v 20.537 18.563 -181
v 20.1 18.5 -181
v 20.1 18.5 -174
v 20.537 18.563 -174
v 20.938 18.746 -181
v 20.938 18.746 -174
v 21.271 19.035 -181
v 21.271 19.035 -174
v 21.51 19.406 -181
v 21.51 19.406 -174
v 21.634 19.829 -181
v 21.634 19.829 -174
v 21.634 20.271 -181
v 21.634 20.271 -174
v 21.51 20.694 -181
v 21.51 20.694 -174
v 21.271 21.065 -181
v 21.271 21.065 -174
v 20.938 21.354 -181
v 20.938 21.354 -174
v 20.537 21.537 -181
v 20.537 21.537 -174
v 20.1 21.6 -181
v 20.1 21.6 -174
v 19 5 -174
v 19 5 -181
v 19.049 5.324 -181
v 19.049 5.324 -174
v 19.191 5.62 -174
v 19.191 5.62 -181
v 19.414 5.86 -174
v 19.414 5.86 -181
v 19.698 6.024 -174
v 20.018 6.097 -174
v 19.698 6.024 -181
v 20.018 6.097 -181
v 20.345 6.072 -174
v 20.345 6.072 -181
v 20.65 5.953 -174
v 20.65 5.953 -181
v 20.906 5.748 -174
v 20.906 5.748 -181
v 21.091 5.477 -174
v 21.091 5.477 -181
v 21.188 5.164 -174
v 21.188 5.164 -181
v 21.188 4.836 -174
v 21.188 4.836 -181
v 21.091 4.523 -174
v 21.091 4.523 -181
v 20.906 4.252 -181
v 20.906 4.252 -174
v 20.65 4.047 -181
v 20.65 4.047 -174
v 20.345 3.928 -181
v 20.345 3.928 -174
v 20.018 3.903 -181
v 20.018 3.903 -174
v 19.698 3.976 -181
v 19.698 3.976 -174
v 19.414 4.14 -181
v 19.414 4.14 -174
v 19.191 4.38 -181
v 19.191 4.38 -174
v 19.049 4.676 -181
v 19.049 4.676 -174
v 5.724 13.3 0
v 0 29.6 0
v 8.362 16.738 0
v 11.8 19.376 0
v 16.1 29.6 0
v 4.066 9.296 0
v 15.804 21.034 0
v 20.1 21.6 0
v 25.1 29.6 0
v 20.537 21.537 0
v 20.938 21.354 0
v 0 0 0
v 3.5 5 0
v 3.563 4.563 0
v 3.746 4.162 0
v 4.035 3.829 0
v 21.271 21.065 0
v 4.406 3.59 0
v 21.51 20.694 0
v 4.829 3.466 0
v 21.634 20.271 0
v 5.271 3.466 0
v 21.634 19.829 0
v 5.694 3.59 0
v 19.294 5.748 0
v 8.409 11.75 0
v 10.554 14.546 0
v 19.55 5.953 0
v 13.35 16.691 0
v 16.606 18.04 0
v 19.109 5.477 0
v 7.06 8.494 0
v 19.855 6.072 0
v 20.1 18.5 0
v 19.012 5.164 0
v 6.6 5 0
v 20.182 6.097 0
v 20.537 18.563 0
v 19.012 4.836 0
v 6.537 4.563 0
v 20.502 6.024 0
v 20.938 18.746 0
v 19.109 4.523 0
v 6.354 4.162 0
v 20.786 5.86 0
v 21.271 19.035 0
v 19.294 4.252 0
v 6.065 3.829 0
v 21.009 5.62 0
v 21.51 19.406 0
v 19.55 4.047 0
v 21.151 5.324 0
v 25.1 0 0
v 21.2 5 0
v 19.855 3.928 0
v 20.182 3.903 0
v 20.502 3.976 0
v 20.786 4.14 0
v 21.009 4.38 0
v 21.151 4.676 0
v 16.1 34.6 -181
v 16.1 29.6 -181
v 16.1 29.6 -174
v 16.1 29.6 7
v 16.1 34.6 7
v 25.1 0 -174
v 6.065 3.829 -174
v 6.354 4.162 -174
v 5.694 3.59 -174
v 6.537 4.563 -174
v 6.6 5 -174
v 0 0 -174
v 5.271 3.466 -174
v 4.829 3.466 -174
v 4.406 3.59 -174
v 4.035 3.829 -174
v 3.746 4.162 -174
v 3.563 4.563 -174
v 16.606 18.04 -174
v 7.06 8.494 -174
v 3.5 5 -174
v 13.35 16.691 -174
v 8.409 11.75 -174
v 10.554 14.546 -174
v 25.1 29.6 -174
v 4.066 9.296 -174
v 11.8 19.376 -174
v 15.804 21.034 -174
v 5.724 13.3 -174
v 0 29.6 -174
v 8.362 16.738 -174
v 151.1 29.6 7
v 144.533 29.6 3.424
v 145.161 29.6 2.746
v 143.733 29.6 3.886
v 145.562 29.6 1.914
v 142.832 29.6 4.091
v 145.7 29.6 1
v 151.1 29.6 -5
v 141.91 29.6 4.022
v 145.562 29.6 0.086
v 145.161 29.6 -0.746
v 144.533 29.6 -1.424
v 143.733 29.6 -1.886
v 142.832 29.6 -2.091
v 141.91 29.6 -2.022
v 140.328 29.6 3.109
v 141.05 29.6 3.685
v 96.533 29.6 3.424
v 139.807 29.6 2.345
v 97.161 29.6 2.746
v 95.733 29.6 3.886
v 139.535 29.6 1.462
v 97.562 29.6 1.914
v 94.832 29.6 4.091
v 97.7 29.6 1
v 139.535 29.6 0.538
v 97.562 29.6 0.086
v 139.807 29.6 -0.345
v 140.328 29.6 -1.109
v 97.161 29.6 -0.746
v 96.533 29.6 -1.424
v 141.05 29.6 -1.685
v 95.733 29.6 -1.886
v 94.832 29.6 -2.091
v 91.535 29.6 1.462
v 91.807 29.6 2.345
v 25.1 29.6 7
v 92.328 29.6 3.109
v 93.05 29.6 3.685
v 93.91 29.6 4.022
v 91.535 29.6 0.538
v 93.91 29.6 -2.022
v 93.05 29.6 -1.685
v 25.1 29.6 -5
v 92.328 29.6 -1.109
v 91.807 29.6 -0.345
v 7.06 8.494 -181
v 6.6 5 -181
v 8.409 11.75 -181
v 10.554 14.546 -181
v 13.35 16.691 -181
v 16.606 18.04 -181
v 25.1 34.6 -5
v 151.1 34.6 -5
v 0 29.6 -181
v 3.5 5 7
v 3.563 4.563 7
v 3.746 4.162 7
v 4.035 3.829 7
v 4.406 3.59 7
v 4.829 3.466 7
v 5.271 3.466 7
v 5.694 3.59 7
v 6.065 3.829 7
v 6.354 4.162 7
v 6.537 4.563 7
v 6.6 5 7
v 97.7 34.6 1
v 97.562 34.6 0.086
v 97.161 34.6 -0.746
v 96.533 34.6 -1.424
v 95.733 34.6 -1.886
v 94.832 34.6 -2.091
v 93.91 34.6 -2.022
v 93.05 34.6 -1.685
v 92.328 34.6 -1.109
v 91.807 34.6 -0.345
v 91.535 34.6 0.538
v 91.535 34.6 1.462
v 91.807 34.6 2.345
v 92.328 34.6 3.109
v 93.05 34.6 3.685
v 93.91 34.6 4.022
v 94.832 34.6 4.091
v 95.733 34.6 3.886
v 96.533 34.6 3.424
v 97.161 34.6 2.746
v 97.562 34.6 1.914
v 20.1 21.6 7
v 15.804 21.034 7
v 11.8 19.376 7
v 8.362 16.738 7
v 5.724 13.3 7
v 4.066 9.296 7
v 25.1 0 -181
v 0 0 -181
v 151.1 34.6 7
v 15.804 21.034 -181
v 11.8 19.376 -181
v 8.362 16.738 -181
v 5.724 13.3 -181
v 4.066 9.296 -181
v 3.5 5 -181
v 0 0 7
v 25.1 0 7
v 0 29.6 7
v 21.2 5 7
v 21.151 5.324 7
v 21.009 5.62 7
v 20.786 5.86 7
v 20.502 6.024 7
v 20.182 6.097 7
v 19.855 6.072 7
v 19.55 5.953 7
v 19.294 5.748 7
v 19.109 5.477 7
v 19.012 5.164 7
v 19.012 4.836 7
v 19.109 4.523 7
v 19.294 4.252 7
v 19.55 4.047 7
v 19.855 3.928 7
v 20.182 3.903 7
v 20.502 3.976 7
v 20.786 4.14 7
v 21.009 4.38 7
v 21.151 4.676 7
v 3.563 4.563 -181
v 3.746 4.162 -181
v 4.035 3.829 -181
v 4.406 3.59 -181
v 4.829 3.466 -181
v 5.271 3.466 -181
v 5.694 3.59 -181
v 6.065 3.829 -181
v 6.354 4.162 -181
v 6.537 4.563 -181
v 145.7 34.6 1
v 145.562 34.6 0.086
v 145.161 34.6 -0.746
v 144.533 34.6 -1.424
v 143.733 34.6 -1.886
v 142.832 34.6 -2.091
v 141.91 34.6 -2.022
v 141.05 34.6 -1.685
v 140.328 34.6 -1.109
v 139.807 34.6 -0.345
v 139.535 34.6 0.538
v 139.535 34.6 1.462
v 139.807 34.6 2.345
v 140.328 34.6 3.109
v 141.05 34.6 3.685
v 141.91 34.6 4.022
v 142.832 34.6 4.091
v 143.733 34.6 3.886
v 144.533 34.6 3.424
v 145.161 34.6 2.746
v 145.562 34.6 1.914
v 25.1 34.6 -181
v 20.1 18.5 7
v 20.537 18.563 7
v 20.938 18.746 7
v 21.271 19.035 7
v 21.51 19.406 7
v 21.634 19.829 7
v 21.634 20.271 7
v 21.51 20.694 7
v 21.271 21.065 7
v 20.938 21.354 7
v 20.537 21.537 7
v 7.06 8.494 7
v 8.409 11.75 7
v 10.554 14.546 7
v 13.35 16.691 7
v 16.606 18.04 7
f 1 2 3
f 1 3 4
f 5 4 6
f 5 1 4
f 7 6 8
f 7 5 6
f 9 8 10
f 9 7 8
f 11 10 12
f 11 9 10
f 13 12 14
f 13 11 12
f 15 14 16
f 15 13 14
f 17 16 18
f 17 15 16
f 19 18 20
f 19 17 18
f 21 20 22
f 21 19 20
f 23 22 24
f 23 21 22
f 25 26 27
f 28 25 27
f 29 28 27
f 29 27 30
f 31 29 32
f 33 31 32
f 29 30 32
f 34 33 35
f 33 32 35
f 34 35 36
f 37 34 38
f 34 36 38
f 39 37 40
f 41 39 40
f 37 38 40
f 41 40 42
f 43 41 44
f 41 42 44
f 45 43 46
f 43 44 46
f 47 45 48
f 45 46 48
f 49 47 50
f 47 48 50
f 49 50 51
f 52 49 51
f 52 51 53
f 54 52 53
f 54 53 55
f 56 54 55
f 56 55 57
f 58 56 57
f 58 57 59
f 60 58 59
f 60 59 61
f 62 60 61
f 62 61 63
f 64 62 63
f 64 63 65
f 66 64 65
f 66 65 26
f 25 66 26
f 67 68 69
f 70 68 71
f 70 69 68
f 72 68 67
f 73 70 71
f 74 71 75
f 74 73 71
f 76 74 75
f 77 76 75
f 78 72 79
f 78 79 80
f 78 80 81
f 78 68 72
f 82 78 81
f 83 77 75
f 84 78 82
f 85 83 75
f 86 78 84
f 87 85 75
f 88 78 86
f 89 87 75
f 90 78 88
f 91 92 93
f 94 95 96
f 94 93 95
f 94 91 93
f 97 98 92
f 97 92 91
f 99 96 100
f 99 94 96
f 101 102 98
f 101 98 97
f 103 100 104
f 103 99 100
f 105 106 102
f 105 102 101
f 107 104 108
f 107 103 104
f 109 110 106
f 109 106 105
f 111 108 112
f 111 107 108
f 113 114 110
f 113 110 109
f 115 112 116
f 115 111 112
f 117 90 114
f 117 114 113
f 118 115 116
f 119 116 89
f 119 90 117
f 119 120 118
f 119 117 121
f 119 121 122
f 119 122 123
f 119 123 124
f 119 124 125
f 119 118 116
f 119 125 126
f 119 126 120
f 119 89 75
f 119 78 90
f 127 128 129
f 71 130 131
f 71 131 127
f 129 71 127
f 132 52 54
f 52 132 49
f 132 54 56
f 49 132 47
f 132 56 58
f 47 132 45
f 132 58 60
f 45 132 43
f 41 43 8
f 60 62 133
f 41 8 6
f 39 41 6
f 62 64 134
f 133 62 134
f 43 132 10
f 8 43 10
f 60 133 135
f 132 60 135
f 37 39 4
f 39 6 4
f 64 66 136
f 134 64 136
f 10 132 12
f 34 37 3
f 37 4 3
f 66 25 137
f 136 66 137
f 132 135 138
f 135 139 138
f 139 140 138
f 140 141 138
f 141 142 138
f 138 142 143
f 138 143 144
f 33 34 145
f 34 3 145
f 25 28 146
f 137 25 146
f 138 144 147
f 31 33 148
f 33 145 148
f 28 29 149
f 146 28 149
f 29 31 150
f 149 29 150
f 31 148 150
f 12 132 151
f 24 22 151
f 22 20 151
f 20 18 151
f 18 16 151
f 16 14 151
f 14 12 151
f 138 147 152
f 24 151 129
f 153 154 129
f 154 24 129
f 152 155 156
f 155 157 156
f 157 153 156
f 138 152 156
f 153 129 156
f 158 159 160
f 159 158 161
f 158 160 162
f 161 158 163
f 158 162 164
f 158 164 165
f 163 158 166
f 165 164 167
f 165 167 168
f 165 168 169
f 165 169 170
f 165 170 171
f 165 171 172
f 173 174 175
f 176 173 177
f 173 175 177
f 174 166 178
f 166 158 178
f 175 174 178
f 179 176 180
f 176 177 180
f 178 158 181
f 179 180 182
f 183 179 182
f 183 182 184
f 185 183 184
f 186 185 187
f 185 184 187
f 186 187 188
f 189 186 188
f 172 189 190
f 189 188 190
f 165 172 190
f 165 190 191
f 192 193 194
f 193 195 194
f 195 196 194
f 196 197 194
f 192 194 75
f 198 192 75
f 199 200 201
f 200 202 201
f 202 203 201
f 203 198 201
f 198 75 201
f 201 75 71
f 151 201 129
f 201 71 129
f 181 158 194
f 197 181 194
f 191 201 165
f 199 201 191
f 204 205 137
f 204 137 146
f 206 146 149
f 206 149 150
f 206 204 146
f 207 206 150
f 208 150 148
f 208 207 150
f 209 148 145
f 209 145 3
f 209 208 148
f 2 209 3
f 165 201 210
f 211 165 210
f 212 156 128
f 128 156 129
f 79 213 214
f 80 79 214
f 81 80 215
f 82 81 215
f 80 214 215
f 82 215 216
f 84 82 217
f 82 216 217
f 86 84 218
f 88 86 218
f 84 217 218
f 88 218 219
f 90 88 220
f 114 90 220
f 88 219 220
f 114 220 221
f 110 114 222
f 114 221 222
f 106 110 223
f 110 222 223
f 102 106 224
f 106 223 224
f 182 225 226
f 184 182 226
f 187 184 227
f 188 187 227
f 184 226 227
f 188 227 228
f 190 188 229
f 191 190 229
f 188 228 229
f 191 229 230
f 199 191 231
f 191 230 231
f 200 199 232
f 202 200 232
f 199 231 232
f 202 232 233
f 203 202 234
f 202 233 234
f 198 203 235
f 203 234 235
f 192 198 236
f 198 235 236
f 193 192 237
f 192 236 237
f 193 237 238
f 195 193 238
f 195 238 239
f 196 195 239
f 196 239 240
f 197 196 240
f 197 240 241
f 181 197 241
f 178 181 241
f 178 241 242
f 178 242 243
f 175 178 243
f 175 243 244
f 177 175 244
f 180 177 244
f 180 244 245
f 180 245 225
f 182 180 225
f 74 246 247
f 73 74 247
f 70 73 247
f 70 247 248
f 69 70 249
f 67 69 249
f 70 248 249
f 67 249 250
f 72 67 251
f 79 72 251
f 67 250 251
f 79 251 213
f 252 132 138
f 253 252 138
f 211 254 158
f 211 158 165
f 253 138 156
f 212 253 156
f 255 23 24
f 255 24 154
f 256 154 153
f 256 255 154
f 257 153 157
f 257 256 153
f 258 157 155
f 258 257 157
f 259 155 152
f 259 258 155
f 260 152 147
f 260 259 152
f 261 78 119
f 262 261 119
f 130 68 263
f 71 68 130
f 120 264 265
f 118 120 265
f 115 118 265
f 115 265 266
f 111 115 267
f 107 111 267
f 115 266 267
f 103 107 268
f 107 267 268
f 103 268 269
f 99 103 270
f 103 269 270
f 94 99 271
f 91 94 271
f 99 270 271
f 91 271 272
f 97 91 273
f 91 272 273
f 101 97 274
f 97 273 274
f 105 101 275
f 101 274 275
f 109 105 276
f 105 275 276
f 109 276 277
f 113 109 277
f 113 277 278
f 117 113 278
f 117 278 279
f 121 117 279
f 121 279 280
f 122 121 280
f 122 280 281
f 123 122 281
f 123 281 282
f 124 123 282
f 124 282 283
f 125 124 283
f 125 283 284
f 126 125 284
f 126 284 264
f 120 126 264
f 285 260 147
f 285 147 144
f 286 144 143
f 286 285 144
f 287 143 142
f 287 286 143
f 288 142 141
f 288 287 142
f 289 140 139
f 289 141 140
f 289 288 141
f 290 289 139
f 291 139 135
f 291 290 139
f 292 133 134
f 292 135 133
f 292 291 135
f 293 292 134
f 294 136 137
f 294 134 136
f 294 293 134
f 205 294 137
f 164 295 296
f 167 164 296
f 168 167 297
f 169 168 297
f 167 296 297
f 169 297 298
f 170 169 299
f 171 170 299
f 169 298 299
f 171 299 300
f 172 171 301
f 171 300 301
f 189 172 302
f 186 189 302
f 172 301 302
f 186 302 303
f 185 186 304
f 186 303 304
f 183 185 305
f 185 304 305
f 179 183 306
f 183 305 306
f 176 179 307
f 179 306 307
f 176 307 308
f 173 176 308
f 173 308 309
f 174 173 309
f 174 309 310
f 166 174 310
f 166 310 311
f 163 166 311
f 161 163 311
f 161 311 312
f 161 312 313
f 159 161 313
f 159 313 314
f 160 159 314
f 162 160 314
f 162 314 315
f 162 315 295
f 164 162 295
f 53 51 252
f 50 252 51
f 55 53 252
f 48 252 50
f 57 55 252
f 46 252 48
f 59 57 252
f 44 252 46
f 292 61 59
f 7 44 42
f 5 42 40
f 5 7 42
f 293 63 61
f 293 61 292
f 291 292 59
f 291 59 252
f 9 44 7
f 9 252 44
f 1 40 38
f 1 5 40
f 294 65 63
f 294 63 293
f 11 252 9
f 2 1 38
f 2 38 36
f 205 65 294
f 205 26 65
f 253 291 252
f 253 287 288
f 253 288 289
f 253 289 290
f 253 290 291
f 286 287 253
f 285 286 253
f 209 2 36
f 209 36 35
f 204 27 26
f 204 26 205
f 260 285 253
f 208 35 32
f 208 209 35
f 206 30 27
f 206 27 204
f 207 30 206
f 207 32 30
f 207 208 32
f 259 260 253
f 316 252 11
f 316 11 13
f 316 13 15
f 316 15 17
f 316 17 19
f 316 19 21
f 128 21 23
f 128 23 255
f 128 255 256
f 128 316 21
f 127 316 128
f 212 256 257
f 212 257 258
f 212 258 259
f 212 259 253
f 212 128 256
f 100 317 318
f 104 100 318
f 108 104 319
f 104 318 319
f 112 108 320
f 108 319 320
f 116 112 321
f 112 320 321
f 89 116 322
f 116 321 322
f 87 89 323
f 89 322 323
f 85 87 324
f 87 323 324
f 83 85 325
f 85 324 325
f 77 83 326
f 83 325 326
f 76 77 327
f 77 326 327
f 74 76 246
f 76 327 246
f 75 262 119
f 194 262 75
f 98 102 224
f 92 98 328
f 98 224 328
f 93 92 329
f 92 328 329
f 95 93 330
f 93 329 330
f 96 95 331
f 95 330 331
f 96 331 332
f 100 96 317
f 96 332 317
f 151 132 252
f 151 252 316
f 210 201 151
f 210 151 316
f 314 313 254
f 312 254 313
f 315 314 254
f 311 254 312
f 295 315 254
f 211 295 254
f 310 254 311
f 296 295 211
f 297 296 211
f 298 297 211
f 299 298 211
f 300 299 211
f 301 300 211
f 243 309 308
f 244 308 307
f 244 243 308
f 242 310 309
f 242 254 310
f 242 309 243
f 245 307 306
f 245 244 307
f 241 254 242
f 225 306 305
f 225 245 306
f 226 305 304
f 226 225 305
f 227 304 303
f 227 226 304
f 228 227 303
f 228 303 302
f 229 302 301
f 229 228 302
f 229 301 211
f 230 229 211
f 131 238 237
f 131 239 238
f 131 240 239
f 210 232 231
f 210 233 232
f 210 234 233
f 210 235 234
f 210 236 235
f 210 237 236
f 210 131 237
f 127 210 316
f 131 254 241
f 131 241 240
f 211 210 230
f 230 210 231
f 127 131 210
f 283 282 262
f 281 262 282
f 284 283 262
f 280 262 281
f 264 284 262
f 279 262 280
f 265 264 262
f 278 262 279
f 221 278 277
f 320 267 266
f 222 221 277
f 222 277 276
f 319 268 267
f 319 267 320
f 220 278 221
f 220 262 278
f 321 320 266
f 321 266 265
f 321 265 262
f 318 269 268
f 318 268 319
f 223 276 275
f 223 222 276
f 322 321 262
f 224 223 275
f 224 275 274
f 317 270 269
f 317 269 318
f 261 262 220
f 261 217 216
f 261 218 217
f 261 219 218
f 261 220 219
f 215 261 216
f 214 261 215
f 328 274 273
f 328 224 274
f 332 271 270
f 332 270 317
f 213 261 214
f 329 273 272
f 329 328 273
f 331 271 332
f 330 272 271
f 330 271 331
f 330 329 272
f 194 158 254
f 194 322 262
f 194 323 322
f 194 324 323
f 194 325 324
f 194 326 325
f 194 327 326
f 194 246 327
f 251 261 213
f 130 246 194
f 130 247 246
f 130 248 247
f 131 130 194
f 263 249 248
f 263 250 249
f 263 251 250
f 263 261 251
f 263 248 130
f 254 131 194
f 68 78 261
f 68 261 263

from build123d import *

# Parameters (mm, degrees)
SKETCH24_W           = 25.1
SKETCH24_H           = 29.6
BOSS_EXTRUDE8_DEPTH  = 7
SKETCH26_W           = 9
SKETCH26_H           = 7
BOSS_EXTRUDE9_DEPTH  = 5
SKETCH27_W           = 9
SKETCH27_H           = 5
BOSS_EXTRUDE10_DEPTH = 174
SKETCH28_W           = 25.1
SKETCH28_H           = 34.6
BOSS_EXTRUDE11_DEPTH = 7
SKETCH29_W           = 16.1
SKETCH29_H           = 5
CUT_EXTRUDE8_DEPTH   = 15
SKETCH32_R           = 1.1
CUT_EXTRUDE11_DEPTH  = 29
SKETCH33_R           = 1.1
CUT_EXTRUDE13_DEPTH  = 21
SKETCH35_W           = 12
SKETCH35_H           = 5
BOSS_EXTRUDE12_DEPTH = 126
SKETCH38_R           = 3.1
CUT_EXTRUDE14_DEPTH  = 126


with BuildPart() as part:
    # Sketch24 → Boss-Extrude8 (new body)
    with BuildSketch(Plane.XY):
        with Locations((12.55, 14.8)):
            Rectangle(SKETCH24_W, SKETCH24_H)
    extrude(amount=BOSS_EXTRUDE8_DEPTH)

    # Sketch26 → Boss-Extrude9 (add)
    with BuildSketch(Plane(origin=(0, 29.6, 0), x_dir=(1, 0, 0), z_dir=(0, 1, 0))):
        with Locations((20.6, -3.5)):
            Rectangle(SKETCH26_W, SKETCH26_H)
    extrude(amount=BOSS_EXTRUDE9_DEPTH)

    # Sketch27 → Boss-Extrude10 (add)
    with BuildSketch(Plane(origin=(0, 0, 0), x_dir=(-1, 0, 0), z_dir=(0, 0, -1))):
        with Locations((-20.6, 32.1)):
            Rectangle(SKETCH27_W, SKETCH27_H)
    extrude(amount=BOSS_EXTRUDE10_DEPTH)

    # Sketch28 → Boss-Extrude11 (add)
    with BuildSketch(Plane(origin=(0, 0, -174), x_dir=(-1, 0, 0), z_dir=(0, 0, -1))):
        with Locations((-12.55, 17.3)):
            Rectangle(SKETCH28_W, SKETCH28_H)
    extrude(amount=BOSS_EXTRUDE11_DEPTH)

    # Sketch29 → Cut-Extrude8 (cut)
    with BuildSketch(Plane.XY.offset(-174)):
        with Locations((8.05, 32.1)):
            Rectangle(SKETCH29_W, SKETCH29_H)
    extrude(amount=-CUT_EXTRUDE8_DEPTH, mode=Mode.SUBTRACT)

    # Sketch32 → Cut-Extrude11 (cut)
    with BuildSketch(Plane(origin=(0, 0, -181), x_dir=(-1, 0, 0), z_dir=(0, 0, -1))):
        with Locations((-20.1, 5)):
            Circle(SKETCH32_R)
        with BuildLine():
            ThreePointArc((-6.6, 5), (-10.554058454, 14.545941546), (-20.1, 18.5))
            ThreePointArc((-20.1, 18.5), (-21.65, 20.05), (-20.1, 21.6))
            ThreePointArc((-20.1, 21.6), (-8.362027432, 16.737972568), (-3.5, 5))
            ThreePointArc((-3.5, 5), (-5.05, 3.45), (-6.6, 5))
        make_face()
    extrude(amount=-CUT_EXTRUDE11_DEPTH, mode=Mode.SUBTRACT)

    # Sketch33 → Cut-Extrude13 (cut)
    with BuildSketch(Plane.XY.offset(7)):
        with Locations((20.1, 5)):
            Circle(SKETCH33_R)
        with BuildLine():
            ThreePointArc((6.6, 5), (10.554058454, 14.545941546), (20.1, 18.5))
            ThreePointArc((20.1, 18.5), (21.65, 20.05), (20.1, 21.6))
            ThreePointArc((20.1, 21.6), (8.362027432, 16.737972568), (3.5, 5))
            ThreePointArc((3.5, 5), (5.05, 3.45), (6.6, 5))
        make_face()
    extrude(amount=-CUT_EXTRUDE13_DEPTH, mode=Mode.SUBTRACT)

    # Sketch35 → Boss-Extrude12 (add)
    with BuildSketch(Plane(origin=(25.1, 0, 0), x_dir=(0, 0, -1), z_dir=(1, 0, 0))):
        with Locations((-1, 32.1)):
            Rectangle(SKETCH35_W, SKETCH35_H)
    extrude(amount=BOSS_EXTRUDE12_DEPTH)

    # Sketch38 → Cut-Extrude14 (cut)
    with BuildSketch(Plane(origin=(0, 34.6, 0), x_dir=(1, 0, 0), z_dir=(0, 1, 0))):
        with Locations((142.6, -1)):
            Circle(SKETCH38_R)
        with Locations((94.6, -1)):
            Circle(SKETCH38_R)
    extrude(amount=-CUT_EXTRUDE14_DEPTH, mode=Mode.SUBTRACT)


solid = part.part
